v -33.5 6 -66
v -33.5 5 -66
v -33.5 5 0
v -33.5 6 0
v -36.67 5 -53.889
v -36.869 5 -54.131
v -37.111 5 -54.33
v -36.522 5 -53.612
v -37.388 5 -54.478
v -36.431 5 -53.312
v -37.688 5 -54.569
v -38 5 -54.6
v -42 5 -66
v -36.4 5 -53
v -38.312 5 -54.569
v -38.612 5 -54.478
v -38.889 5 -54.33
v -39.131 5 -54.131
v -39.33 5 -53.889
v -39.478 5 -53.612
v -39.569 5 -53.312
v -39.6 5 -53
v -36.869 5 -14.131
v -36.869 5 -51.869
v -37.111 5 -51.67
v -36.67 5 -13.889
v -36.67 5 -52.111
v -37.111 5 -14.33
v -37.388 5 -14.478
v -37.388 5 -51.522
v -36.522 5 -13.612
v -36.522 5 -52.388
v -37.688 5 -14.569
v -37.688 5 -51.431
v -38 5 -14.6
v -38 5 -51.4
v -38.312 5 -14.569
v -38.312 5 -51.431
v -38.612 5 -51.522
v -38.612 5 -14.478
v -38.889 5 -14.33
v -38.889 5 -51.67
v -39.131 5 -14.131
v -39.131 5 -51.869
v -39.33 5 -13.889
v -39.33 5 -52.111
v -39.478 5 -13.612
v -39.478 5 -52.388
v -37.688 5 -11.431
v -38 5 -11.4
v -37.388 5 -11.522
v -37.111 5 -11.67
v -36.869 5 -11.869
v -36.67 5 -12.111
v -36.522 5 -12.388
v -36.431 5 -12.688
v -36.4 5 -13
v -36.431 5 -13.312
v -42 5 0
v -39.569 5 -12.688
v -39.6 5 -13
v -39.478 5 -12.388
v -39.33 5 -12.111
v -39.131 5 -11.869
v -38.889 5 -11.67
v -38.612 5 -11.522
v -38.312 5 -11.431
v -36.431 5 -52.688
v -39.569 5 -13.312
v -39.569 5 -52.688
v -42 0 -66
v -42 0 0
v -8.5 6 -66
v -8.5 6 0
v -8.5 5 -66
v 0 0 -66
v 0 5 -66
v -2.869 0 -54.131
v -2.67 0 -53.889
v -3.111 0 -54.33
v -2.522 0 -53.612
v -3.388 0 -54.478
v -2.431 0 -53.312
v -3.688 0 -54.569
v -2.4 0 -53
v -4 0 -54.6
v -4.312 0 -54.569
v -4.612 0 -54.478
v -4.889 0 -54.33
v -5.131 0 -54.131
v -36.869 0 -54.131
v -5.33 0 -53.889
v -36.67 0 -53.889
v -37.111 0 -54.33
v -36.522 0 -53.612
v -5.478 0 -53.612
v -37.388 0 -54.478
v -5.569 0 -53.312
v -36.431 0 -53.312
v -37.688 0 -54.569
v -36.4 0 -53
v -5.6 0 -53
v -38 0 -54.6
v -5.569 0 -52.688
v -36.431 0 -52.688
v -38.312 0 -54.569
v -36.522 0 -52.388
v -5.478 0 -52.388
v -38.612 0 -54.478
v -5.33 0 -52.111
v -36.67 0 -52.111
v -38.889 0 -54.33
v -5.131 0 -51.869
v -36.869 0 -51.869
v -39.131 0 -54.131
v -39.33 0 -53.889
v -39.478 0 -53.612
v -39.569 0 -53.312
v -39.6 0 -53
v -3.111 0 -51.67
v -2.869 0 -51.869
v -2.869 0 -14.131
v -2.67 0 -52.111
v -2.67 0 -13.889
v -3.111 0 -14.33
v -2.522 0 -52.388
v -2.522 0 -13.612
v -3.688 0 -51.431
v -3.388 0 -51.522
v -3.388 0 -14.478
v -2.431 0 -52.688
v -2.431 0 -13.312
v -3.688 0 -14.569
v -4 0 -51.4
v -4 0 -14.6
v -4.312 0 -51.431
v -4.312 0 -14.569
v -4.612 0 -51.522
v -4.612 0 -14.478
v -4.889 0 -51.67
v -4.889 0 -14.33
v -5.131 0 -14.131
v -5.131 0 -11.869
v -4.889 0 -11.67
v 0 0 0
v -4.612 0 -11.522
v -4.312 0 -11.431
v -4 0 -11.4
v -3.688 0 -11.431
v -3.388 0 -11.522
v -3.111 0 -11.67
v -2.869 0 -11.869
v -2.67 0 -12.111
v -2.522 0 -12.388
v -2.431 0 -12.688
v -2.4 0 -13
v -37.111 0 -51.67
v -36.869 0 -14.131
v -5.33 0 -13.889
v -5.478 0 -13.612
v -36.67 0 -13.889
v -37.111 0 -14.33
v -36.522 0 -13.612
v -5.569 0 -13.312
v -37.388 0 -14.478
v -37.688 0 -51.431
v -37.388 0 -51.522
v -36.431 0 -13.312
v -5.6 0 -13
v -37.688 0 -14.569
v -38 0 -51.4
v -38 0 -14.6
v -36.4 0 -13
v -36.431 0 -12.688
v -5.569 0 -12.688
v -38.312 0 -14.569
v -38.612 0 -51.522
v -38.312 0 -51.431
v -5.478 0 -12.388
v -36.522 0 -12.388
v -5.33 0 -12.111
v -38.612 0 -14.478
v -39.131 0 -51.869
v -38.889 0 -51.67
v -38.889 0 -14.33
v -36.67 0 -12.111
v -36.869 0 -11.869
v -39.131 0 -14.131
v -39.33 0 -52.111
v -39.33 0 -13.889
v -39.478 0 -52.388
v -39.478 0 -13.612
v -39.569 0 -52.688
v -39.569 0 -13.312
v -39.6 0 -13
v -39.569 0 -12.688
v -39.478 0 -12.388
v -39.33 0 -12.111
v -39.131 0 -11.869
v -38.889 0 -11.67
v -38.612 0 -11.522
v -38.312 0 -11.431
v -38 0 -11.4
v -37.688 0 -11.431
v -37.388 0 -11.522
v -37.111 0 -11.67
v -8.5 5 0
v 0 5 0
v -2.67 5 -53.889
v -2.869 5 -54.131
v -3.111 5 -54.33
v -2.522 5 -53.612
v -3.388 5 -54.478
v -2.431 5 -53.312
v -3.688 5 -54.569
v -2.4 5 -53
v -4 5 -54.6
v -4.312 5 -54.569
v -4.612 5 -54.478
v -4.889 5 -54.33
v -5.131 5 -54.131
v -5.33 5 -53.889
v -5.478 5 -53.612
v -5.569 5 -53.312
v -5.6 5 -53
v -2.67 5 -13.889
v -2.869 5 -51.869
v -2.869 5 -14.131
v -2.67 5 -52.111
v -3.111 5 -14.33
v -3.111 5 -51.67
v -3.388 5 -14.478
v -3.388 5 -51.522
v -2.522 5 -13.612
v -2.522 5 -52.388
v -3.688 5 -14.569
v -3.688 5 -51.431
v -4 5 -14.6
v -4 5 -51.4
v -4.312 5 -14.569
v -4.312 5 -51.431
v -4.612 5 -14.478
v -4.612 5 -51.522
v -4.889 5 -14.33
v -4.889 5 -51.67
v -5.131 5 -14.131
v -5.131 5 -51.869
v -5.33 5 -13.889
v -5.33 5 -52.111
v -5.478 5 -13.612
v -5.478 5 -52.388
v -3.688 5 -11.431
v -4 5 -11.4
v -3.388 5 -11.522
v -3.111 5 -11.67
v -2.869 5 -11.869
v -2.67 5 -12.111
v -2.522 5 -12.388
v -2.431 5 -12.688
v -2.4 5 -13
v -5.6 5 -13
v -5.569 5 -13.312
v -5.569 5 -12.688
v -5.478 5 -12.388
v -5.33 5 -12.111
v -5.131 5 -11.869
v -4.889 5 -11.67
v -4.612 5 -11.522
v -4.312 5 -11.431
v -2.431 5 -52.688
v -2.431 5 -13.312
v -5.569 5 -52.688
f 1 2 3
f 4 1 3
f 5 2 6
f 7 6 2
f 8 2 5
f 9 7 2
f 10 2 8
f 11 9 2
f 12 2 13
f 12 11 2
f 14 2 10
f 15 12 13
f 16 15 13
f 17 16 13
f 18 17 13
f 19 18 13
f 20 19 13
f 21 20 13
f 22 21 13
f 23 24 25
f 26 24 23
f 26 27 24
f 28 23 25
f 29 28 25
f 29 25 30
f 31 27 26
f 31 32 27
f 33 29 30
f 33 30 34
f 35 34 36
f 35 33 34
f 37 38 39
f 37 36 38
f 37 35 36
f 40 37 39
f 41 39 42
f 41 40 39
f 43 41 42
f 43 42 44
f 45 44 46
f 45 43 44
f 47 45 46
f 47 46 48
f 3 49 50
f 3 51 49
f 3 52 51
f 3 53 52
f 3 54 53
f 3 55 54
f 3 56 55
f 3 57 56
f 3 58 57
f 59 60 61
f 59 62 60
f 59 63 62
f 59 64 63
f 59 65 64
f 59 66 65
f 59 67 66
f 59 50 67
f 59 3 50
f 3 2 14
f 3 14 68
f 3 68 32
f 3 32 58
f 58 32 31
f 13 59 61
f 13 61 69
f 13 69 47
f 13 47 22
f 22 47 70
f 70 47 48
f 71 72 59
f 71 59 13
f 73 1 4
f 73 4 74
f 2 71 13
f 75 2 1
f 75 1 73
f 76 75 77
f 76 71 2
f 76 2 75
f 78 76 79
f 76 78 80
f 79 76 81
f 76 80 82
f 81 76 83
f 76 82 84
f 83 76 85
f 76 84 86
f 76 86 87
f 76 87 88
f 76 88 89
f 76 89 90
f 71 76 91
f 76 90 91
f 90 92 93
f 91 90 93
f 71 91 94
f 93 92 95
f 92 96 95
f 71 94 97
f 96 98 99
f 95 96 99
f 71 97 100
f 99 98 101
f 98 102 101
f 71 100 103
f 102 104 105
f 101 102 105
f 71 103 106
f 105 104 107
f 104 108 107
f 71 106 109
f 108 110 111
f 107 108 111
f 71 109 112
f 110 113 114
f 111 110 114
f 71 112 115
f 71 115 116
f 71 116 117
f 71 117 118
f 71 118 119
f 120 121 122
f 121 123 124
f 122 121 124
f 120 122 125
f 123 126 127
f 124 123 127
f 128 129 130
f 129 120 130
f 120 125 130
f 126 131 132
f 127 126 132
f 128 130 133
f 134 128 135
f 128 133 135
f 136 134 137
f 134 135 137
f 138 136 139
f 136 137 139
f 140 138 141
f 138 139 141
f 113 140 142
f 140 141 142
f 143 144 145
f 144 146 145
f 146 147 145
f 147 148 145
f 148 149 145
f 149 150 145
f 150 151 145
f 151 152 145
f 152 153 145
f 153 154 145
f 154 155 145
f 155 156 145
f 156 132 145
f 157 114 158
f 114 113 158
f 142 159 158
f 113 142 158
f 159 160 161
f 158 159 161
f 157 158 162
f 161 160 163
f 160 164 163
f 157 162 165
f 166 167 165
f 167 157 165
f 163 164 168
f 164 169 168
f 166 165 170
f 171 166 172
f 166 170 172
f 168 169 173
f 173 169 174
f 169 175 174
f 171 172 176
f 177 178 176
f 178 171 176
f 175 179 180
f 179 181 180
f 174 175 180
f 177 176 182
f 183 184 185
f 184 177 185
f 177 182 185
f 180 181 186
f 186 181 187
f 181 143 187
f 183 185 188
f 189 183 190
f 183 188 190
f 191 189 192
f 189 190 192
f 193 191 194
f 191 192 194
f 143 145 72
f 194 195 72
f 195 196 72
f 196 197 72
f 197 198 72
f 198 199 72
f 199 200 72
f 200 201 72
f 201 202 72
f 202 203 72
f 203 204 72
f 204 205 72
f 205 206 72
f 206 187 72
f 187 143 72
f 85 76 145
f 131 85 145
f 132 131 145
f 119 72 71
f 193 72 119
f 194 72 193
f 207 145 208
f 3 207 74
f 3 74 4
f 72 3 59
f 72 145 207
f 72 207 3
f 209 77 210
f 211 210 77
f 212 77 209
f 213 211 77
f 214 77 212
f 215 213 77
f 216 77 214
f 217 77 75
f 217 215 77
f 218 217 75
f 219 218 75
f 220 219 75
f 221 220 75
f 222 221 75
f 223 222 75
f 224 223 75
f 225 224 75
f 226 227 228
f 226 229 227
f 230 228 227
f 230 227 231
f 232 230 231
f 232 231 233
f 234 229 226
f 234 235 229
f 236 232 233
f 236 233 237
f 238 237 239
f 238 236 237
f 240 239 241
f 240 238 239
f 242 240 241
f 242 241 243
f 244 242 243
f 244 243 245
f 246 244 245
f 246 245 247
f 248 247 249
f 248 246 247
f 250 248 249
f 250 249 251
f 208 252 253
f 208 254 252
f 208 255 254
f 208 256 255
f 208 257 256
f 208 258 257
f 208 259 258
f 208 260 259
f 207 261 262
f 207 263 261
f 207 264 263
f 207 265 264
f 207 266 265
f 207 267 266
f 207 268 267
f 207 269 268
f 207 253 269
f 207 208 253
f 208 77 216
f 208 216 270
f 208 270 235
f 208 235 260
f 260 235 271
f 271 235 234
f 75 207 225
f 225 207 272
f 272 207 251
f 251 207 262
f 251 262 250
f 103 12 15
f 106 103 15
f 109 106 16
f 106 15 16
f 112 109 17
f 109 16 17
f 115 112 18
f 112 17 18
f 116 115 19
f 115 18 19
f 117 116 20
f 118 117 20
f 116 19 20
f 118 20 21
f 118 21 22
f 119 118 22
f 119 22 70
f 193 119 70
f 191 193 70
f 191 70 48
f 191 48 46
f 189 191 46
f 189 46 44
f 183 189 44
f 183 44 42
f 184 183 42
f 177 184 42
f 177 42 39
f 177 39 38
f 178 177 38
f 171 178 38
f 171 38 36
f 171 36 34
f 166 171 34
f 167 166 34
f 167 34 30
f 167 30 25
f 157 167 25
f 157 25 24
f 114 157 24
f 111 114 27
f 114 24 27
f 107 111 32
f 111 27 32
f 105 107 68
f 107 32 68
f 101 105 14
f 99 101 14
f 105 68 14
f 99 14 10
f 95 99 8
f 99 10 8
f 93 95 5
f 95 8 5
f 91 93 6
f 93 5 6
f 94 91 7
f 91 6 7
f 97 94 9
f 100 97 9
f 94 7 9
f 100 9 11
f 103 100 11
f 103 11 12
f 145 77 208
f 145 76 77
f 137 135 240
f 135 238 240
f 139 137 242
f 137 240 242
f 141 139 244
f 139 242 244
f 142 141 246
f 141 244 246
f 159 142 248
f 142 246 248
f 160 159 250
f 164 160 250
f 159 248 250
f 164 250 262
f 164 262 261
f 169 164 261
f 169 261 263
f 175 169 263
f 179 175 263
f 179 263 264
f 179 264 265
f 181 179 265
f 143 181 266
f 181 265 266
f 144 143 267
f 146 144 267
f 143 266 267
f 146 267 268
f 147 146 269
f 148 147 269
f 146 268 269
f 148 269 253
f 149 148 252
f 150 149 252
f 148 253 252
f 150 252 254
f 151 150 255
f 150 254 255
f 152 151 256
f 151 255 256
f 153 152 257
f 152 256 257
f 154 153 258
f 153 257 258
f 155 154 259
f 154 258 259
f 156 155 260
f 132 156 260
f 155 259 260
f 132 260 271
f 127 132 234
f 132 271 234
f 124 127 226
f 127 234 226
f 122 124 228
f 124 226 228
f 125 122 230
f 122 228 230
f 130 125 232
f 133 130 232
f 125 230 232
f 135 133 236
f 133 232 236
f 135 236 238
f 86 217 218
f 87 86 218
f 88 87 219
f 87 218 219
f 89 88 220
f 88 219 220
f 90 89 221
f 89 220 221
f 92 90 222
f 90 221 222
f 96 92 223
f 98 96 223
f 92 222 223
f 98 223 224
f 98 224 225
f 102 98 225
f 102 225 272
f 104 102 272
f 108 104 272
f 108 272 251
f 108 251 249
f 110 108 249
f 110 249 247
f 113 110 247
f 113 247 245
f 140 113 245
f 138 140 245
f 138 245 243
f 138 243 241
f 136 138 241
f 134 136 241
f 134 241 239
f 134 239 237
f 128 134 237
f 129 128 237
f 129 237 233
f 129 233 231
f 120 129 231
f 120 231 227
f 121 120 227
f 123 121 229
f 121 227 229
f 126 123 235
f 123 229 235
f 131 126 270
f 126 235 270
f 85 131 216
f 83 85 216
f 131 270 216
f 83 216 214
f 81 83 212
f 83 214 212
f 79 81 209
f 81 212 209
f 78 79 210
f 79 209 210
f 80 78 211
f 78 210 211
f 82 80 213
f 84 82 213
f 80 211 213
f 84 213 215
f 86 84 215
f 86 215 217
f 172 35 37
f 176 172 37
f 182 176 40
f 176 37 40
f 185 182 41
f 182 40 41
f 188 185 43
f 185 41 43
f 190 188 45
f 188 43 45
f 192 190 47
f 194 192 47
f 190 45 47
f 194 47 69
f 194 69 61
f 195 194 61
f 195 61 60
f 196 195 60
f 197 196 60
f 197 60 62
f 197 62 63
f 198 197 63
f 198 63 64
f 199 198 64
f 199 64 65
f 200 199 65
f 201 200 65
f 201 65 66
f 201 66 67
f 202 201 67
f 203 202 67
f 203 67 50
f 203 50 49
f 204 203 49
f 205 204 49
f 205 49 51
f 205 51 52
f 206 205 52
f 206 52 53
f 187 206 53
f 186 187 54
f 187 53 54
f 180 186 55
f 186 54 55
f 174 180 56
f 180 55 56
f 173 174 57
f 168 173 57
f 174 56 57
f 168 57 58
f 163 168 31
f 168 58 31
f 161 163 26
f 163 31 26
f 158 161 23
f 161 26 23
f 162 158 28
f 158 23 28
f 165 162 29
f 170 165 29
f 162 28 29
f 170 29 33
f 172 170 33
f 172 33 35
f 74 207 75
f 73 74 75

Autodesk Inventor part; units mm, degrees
ref_plane "YZ Plane" through (0, 0, 0) normal (1, 0, 0) x (0, 1, 0)
ref_plane "XZ Plane" through (0, 0, 0) normal (0, 1, 0) x (-1, 0, 0)
ref_plane "XY Plane" through (0, 0, 0) normal (0, 0, 1) x (1, 0, 0)
sketch "スケッチ1" plane through (0, 0, 0) normal (0, 1, 0) x (-1, 0, 0)
  line L0 (0, 0) -> (42, 0)
  line L1 (42, 0) -> (42, -66)
  line L2 (42, -66) -> (0, -66)
  line L3 (0, -66) -> (0, 0)
  dimension "d0" = 42
  dimension "d1" = 66
extrude "押し出し1" add sketch "スケッチ1" along normal blind 5
sketch "スケッチ2" plane through (0, 5, 0) normal (0, 1, 0) x (1, 0, 0)
  line L0 (0, 66) -> (-42, 66) projected
  line L1 (-33.5, 0) -> (-8.5, 0)
  line L2 (-8.5, 0) -> (-8.5, 66)
  line L3 (-8.5, 66) -> (-33.5, 66)
  line L4 (-33.5, 66) -> (-33.5, 0)
  line L5 (-42, 66) -> (-42, 0) projected
  point P0 (0, 0)
  dimension "d4" = 25
  dimension "d5" = 8.5
extrude "押し出し2" add sketch "スケッチ2" along normal blind 1
sketch "スケッチ3" plane through (0, 0, 0) normal (0, -1, 0) x (1, 0, 0)
  line L0 (0, 0) -> (0, -66) projected
  line L1 (0, -66) -> (-42, -66) projected
  point P0 (-4, -13)
  point P1 (-4, -53)
  point P2 (-38, -53)
  point P3 (-38, -13)
  dimension "d8" = 40
  dimension "d10" = 4
  dimension "d11" = 13
hole "穴1" at (-4, 0, -13) at (-4, 0, -53) at (-38, 0, -53) at (-38, 0, -13) direction (0, 1, 0) diameter 3.2 depth 30 tip angle 118
properties part number "slider_move_gaba" material "アルミニウム 6061-AHC"
